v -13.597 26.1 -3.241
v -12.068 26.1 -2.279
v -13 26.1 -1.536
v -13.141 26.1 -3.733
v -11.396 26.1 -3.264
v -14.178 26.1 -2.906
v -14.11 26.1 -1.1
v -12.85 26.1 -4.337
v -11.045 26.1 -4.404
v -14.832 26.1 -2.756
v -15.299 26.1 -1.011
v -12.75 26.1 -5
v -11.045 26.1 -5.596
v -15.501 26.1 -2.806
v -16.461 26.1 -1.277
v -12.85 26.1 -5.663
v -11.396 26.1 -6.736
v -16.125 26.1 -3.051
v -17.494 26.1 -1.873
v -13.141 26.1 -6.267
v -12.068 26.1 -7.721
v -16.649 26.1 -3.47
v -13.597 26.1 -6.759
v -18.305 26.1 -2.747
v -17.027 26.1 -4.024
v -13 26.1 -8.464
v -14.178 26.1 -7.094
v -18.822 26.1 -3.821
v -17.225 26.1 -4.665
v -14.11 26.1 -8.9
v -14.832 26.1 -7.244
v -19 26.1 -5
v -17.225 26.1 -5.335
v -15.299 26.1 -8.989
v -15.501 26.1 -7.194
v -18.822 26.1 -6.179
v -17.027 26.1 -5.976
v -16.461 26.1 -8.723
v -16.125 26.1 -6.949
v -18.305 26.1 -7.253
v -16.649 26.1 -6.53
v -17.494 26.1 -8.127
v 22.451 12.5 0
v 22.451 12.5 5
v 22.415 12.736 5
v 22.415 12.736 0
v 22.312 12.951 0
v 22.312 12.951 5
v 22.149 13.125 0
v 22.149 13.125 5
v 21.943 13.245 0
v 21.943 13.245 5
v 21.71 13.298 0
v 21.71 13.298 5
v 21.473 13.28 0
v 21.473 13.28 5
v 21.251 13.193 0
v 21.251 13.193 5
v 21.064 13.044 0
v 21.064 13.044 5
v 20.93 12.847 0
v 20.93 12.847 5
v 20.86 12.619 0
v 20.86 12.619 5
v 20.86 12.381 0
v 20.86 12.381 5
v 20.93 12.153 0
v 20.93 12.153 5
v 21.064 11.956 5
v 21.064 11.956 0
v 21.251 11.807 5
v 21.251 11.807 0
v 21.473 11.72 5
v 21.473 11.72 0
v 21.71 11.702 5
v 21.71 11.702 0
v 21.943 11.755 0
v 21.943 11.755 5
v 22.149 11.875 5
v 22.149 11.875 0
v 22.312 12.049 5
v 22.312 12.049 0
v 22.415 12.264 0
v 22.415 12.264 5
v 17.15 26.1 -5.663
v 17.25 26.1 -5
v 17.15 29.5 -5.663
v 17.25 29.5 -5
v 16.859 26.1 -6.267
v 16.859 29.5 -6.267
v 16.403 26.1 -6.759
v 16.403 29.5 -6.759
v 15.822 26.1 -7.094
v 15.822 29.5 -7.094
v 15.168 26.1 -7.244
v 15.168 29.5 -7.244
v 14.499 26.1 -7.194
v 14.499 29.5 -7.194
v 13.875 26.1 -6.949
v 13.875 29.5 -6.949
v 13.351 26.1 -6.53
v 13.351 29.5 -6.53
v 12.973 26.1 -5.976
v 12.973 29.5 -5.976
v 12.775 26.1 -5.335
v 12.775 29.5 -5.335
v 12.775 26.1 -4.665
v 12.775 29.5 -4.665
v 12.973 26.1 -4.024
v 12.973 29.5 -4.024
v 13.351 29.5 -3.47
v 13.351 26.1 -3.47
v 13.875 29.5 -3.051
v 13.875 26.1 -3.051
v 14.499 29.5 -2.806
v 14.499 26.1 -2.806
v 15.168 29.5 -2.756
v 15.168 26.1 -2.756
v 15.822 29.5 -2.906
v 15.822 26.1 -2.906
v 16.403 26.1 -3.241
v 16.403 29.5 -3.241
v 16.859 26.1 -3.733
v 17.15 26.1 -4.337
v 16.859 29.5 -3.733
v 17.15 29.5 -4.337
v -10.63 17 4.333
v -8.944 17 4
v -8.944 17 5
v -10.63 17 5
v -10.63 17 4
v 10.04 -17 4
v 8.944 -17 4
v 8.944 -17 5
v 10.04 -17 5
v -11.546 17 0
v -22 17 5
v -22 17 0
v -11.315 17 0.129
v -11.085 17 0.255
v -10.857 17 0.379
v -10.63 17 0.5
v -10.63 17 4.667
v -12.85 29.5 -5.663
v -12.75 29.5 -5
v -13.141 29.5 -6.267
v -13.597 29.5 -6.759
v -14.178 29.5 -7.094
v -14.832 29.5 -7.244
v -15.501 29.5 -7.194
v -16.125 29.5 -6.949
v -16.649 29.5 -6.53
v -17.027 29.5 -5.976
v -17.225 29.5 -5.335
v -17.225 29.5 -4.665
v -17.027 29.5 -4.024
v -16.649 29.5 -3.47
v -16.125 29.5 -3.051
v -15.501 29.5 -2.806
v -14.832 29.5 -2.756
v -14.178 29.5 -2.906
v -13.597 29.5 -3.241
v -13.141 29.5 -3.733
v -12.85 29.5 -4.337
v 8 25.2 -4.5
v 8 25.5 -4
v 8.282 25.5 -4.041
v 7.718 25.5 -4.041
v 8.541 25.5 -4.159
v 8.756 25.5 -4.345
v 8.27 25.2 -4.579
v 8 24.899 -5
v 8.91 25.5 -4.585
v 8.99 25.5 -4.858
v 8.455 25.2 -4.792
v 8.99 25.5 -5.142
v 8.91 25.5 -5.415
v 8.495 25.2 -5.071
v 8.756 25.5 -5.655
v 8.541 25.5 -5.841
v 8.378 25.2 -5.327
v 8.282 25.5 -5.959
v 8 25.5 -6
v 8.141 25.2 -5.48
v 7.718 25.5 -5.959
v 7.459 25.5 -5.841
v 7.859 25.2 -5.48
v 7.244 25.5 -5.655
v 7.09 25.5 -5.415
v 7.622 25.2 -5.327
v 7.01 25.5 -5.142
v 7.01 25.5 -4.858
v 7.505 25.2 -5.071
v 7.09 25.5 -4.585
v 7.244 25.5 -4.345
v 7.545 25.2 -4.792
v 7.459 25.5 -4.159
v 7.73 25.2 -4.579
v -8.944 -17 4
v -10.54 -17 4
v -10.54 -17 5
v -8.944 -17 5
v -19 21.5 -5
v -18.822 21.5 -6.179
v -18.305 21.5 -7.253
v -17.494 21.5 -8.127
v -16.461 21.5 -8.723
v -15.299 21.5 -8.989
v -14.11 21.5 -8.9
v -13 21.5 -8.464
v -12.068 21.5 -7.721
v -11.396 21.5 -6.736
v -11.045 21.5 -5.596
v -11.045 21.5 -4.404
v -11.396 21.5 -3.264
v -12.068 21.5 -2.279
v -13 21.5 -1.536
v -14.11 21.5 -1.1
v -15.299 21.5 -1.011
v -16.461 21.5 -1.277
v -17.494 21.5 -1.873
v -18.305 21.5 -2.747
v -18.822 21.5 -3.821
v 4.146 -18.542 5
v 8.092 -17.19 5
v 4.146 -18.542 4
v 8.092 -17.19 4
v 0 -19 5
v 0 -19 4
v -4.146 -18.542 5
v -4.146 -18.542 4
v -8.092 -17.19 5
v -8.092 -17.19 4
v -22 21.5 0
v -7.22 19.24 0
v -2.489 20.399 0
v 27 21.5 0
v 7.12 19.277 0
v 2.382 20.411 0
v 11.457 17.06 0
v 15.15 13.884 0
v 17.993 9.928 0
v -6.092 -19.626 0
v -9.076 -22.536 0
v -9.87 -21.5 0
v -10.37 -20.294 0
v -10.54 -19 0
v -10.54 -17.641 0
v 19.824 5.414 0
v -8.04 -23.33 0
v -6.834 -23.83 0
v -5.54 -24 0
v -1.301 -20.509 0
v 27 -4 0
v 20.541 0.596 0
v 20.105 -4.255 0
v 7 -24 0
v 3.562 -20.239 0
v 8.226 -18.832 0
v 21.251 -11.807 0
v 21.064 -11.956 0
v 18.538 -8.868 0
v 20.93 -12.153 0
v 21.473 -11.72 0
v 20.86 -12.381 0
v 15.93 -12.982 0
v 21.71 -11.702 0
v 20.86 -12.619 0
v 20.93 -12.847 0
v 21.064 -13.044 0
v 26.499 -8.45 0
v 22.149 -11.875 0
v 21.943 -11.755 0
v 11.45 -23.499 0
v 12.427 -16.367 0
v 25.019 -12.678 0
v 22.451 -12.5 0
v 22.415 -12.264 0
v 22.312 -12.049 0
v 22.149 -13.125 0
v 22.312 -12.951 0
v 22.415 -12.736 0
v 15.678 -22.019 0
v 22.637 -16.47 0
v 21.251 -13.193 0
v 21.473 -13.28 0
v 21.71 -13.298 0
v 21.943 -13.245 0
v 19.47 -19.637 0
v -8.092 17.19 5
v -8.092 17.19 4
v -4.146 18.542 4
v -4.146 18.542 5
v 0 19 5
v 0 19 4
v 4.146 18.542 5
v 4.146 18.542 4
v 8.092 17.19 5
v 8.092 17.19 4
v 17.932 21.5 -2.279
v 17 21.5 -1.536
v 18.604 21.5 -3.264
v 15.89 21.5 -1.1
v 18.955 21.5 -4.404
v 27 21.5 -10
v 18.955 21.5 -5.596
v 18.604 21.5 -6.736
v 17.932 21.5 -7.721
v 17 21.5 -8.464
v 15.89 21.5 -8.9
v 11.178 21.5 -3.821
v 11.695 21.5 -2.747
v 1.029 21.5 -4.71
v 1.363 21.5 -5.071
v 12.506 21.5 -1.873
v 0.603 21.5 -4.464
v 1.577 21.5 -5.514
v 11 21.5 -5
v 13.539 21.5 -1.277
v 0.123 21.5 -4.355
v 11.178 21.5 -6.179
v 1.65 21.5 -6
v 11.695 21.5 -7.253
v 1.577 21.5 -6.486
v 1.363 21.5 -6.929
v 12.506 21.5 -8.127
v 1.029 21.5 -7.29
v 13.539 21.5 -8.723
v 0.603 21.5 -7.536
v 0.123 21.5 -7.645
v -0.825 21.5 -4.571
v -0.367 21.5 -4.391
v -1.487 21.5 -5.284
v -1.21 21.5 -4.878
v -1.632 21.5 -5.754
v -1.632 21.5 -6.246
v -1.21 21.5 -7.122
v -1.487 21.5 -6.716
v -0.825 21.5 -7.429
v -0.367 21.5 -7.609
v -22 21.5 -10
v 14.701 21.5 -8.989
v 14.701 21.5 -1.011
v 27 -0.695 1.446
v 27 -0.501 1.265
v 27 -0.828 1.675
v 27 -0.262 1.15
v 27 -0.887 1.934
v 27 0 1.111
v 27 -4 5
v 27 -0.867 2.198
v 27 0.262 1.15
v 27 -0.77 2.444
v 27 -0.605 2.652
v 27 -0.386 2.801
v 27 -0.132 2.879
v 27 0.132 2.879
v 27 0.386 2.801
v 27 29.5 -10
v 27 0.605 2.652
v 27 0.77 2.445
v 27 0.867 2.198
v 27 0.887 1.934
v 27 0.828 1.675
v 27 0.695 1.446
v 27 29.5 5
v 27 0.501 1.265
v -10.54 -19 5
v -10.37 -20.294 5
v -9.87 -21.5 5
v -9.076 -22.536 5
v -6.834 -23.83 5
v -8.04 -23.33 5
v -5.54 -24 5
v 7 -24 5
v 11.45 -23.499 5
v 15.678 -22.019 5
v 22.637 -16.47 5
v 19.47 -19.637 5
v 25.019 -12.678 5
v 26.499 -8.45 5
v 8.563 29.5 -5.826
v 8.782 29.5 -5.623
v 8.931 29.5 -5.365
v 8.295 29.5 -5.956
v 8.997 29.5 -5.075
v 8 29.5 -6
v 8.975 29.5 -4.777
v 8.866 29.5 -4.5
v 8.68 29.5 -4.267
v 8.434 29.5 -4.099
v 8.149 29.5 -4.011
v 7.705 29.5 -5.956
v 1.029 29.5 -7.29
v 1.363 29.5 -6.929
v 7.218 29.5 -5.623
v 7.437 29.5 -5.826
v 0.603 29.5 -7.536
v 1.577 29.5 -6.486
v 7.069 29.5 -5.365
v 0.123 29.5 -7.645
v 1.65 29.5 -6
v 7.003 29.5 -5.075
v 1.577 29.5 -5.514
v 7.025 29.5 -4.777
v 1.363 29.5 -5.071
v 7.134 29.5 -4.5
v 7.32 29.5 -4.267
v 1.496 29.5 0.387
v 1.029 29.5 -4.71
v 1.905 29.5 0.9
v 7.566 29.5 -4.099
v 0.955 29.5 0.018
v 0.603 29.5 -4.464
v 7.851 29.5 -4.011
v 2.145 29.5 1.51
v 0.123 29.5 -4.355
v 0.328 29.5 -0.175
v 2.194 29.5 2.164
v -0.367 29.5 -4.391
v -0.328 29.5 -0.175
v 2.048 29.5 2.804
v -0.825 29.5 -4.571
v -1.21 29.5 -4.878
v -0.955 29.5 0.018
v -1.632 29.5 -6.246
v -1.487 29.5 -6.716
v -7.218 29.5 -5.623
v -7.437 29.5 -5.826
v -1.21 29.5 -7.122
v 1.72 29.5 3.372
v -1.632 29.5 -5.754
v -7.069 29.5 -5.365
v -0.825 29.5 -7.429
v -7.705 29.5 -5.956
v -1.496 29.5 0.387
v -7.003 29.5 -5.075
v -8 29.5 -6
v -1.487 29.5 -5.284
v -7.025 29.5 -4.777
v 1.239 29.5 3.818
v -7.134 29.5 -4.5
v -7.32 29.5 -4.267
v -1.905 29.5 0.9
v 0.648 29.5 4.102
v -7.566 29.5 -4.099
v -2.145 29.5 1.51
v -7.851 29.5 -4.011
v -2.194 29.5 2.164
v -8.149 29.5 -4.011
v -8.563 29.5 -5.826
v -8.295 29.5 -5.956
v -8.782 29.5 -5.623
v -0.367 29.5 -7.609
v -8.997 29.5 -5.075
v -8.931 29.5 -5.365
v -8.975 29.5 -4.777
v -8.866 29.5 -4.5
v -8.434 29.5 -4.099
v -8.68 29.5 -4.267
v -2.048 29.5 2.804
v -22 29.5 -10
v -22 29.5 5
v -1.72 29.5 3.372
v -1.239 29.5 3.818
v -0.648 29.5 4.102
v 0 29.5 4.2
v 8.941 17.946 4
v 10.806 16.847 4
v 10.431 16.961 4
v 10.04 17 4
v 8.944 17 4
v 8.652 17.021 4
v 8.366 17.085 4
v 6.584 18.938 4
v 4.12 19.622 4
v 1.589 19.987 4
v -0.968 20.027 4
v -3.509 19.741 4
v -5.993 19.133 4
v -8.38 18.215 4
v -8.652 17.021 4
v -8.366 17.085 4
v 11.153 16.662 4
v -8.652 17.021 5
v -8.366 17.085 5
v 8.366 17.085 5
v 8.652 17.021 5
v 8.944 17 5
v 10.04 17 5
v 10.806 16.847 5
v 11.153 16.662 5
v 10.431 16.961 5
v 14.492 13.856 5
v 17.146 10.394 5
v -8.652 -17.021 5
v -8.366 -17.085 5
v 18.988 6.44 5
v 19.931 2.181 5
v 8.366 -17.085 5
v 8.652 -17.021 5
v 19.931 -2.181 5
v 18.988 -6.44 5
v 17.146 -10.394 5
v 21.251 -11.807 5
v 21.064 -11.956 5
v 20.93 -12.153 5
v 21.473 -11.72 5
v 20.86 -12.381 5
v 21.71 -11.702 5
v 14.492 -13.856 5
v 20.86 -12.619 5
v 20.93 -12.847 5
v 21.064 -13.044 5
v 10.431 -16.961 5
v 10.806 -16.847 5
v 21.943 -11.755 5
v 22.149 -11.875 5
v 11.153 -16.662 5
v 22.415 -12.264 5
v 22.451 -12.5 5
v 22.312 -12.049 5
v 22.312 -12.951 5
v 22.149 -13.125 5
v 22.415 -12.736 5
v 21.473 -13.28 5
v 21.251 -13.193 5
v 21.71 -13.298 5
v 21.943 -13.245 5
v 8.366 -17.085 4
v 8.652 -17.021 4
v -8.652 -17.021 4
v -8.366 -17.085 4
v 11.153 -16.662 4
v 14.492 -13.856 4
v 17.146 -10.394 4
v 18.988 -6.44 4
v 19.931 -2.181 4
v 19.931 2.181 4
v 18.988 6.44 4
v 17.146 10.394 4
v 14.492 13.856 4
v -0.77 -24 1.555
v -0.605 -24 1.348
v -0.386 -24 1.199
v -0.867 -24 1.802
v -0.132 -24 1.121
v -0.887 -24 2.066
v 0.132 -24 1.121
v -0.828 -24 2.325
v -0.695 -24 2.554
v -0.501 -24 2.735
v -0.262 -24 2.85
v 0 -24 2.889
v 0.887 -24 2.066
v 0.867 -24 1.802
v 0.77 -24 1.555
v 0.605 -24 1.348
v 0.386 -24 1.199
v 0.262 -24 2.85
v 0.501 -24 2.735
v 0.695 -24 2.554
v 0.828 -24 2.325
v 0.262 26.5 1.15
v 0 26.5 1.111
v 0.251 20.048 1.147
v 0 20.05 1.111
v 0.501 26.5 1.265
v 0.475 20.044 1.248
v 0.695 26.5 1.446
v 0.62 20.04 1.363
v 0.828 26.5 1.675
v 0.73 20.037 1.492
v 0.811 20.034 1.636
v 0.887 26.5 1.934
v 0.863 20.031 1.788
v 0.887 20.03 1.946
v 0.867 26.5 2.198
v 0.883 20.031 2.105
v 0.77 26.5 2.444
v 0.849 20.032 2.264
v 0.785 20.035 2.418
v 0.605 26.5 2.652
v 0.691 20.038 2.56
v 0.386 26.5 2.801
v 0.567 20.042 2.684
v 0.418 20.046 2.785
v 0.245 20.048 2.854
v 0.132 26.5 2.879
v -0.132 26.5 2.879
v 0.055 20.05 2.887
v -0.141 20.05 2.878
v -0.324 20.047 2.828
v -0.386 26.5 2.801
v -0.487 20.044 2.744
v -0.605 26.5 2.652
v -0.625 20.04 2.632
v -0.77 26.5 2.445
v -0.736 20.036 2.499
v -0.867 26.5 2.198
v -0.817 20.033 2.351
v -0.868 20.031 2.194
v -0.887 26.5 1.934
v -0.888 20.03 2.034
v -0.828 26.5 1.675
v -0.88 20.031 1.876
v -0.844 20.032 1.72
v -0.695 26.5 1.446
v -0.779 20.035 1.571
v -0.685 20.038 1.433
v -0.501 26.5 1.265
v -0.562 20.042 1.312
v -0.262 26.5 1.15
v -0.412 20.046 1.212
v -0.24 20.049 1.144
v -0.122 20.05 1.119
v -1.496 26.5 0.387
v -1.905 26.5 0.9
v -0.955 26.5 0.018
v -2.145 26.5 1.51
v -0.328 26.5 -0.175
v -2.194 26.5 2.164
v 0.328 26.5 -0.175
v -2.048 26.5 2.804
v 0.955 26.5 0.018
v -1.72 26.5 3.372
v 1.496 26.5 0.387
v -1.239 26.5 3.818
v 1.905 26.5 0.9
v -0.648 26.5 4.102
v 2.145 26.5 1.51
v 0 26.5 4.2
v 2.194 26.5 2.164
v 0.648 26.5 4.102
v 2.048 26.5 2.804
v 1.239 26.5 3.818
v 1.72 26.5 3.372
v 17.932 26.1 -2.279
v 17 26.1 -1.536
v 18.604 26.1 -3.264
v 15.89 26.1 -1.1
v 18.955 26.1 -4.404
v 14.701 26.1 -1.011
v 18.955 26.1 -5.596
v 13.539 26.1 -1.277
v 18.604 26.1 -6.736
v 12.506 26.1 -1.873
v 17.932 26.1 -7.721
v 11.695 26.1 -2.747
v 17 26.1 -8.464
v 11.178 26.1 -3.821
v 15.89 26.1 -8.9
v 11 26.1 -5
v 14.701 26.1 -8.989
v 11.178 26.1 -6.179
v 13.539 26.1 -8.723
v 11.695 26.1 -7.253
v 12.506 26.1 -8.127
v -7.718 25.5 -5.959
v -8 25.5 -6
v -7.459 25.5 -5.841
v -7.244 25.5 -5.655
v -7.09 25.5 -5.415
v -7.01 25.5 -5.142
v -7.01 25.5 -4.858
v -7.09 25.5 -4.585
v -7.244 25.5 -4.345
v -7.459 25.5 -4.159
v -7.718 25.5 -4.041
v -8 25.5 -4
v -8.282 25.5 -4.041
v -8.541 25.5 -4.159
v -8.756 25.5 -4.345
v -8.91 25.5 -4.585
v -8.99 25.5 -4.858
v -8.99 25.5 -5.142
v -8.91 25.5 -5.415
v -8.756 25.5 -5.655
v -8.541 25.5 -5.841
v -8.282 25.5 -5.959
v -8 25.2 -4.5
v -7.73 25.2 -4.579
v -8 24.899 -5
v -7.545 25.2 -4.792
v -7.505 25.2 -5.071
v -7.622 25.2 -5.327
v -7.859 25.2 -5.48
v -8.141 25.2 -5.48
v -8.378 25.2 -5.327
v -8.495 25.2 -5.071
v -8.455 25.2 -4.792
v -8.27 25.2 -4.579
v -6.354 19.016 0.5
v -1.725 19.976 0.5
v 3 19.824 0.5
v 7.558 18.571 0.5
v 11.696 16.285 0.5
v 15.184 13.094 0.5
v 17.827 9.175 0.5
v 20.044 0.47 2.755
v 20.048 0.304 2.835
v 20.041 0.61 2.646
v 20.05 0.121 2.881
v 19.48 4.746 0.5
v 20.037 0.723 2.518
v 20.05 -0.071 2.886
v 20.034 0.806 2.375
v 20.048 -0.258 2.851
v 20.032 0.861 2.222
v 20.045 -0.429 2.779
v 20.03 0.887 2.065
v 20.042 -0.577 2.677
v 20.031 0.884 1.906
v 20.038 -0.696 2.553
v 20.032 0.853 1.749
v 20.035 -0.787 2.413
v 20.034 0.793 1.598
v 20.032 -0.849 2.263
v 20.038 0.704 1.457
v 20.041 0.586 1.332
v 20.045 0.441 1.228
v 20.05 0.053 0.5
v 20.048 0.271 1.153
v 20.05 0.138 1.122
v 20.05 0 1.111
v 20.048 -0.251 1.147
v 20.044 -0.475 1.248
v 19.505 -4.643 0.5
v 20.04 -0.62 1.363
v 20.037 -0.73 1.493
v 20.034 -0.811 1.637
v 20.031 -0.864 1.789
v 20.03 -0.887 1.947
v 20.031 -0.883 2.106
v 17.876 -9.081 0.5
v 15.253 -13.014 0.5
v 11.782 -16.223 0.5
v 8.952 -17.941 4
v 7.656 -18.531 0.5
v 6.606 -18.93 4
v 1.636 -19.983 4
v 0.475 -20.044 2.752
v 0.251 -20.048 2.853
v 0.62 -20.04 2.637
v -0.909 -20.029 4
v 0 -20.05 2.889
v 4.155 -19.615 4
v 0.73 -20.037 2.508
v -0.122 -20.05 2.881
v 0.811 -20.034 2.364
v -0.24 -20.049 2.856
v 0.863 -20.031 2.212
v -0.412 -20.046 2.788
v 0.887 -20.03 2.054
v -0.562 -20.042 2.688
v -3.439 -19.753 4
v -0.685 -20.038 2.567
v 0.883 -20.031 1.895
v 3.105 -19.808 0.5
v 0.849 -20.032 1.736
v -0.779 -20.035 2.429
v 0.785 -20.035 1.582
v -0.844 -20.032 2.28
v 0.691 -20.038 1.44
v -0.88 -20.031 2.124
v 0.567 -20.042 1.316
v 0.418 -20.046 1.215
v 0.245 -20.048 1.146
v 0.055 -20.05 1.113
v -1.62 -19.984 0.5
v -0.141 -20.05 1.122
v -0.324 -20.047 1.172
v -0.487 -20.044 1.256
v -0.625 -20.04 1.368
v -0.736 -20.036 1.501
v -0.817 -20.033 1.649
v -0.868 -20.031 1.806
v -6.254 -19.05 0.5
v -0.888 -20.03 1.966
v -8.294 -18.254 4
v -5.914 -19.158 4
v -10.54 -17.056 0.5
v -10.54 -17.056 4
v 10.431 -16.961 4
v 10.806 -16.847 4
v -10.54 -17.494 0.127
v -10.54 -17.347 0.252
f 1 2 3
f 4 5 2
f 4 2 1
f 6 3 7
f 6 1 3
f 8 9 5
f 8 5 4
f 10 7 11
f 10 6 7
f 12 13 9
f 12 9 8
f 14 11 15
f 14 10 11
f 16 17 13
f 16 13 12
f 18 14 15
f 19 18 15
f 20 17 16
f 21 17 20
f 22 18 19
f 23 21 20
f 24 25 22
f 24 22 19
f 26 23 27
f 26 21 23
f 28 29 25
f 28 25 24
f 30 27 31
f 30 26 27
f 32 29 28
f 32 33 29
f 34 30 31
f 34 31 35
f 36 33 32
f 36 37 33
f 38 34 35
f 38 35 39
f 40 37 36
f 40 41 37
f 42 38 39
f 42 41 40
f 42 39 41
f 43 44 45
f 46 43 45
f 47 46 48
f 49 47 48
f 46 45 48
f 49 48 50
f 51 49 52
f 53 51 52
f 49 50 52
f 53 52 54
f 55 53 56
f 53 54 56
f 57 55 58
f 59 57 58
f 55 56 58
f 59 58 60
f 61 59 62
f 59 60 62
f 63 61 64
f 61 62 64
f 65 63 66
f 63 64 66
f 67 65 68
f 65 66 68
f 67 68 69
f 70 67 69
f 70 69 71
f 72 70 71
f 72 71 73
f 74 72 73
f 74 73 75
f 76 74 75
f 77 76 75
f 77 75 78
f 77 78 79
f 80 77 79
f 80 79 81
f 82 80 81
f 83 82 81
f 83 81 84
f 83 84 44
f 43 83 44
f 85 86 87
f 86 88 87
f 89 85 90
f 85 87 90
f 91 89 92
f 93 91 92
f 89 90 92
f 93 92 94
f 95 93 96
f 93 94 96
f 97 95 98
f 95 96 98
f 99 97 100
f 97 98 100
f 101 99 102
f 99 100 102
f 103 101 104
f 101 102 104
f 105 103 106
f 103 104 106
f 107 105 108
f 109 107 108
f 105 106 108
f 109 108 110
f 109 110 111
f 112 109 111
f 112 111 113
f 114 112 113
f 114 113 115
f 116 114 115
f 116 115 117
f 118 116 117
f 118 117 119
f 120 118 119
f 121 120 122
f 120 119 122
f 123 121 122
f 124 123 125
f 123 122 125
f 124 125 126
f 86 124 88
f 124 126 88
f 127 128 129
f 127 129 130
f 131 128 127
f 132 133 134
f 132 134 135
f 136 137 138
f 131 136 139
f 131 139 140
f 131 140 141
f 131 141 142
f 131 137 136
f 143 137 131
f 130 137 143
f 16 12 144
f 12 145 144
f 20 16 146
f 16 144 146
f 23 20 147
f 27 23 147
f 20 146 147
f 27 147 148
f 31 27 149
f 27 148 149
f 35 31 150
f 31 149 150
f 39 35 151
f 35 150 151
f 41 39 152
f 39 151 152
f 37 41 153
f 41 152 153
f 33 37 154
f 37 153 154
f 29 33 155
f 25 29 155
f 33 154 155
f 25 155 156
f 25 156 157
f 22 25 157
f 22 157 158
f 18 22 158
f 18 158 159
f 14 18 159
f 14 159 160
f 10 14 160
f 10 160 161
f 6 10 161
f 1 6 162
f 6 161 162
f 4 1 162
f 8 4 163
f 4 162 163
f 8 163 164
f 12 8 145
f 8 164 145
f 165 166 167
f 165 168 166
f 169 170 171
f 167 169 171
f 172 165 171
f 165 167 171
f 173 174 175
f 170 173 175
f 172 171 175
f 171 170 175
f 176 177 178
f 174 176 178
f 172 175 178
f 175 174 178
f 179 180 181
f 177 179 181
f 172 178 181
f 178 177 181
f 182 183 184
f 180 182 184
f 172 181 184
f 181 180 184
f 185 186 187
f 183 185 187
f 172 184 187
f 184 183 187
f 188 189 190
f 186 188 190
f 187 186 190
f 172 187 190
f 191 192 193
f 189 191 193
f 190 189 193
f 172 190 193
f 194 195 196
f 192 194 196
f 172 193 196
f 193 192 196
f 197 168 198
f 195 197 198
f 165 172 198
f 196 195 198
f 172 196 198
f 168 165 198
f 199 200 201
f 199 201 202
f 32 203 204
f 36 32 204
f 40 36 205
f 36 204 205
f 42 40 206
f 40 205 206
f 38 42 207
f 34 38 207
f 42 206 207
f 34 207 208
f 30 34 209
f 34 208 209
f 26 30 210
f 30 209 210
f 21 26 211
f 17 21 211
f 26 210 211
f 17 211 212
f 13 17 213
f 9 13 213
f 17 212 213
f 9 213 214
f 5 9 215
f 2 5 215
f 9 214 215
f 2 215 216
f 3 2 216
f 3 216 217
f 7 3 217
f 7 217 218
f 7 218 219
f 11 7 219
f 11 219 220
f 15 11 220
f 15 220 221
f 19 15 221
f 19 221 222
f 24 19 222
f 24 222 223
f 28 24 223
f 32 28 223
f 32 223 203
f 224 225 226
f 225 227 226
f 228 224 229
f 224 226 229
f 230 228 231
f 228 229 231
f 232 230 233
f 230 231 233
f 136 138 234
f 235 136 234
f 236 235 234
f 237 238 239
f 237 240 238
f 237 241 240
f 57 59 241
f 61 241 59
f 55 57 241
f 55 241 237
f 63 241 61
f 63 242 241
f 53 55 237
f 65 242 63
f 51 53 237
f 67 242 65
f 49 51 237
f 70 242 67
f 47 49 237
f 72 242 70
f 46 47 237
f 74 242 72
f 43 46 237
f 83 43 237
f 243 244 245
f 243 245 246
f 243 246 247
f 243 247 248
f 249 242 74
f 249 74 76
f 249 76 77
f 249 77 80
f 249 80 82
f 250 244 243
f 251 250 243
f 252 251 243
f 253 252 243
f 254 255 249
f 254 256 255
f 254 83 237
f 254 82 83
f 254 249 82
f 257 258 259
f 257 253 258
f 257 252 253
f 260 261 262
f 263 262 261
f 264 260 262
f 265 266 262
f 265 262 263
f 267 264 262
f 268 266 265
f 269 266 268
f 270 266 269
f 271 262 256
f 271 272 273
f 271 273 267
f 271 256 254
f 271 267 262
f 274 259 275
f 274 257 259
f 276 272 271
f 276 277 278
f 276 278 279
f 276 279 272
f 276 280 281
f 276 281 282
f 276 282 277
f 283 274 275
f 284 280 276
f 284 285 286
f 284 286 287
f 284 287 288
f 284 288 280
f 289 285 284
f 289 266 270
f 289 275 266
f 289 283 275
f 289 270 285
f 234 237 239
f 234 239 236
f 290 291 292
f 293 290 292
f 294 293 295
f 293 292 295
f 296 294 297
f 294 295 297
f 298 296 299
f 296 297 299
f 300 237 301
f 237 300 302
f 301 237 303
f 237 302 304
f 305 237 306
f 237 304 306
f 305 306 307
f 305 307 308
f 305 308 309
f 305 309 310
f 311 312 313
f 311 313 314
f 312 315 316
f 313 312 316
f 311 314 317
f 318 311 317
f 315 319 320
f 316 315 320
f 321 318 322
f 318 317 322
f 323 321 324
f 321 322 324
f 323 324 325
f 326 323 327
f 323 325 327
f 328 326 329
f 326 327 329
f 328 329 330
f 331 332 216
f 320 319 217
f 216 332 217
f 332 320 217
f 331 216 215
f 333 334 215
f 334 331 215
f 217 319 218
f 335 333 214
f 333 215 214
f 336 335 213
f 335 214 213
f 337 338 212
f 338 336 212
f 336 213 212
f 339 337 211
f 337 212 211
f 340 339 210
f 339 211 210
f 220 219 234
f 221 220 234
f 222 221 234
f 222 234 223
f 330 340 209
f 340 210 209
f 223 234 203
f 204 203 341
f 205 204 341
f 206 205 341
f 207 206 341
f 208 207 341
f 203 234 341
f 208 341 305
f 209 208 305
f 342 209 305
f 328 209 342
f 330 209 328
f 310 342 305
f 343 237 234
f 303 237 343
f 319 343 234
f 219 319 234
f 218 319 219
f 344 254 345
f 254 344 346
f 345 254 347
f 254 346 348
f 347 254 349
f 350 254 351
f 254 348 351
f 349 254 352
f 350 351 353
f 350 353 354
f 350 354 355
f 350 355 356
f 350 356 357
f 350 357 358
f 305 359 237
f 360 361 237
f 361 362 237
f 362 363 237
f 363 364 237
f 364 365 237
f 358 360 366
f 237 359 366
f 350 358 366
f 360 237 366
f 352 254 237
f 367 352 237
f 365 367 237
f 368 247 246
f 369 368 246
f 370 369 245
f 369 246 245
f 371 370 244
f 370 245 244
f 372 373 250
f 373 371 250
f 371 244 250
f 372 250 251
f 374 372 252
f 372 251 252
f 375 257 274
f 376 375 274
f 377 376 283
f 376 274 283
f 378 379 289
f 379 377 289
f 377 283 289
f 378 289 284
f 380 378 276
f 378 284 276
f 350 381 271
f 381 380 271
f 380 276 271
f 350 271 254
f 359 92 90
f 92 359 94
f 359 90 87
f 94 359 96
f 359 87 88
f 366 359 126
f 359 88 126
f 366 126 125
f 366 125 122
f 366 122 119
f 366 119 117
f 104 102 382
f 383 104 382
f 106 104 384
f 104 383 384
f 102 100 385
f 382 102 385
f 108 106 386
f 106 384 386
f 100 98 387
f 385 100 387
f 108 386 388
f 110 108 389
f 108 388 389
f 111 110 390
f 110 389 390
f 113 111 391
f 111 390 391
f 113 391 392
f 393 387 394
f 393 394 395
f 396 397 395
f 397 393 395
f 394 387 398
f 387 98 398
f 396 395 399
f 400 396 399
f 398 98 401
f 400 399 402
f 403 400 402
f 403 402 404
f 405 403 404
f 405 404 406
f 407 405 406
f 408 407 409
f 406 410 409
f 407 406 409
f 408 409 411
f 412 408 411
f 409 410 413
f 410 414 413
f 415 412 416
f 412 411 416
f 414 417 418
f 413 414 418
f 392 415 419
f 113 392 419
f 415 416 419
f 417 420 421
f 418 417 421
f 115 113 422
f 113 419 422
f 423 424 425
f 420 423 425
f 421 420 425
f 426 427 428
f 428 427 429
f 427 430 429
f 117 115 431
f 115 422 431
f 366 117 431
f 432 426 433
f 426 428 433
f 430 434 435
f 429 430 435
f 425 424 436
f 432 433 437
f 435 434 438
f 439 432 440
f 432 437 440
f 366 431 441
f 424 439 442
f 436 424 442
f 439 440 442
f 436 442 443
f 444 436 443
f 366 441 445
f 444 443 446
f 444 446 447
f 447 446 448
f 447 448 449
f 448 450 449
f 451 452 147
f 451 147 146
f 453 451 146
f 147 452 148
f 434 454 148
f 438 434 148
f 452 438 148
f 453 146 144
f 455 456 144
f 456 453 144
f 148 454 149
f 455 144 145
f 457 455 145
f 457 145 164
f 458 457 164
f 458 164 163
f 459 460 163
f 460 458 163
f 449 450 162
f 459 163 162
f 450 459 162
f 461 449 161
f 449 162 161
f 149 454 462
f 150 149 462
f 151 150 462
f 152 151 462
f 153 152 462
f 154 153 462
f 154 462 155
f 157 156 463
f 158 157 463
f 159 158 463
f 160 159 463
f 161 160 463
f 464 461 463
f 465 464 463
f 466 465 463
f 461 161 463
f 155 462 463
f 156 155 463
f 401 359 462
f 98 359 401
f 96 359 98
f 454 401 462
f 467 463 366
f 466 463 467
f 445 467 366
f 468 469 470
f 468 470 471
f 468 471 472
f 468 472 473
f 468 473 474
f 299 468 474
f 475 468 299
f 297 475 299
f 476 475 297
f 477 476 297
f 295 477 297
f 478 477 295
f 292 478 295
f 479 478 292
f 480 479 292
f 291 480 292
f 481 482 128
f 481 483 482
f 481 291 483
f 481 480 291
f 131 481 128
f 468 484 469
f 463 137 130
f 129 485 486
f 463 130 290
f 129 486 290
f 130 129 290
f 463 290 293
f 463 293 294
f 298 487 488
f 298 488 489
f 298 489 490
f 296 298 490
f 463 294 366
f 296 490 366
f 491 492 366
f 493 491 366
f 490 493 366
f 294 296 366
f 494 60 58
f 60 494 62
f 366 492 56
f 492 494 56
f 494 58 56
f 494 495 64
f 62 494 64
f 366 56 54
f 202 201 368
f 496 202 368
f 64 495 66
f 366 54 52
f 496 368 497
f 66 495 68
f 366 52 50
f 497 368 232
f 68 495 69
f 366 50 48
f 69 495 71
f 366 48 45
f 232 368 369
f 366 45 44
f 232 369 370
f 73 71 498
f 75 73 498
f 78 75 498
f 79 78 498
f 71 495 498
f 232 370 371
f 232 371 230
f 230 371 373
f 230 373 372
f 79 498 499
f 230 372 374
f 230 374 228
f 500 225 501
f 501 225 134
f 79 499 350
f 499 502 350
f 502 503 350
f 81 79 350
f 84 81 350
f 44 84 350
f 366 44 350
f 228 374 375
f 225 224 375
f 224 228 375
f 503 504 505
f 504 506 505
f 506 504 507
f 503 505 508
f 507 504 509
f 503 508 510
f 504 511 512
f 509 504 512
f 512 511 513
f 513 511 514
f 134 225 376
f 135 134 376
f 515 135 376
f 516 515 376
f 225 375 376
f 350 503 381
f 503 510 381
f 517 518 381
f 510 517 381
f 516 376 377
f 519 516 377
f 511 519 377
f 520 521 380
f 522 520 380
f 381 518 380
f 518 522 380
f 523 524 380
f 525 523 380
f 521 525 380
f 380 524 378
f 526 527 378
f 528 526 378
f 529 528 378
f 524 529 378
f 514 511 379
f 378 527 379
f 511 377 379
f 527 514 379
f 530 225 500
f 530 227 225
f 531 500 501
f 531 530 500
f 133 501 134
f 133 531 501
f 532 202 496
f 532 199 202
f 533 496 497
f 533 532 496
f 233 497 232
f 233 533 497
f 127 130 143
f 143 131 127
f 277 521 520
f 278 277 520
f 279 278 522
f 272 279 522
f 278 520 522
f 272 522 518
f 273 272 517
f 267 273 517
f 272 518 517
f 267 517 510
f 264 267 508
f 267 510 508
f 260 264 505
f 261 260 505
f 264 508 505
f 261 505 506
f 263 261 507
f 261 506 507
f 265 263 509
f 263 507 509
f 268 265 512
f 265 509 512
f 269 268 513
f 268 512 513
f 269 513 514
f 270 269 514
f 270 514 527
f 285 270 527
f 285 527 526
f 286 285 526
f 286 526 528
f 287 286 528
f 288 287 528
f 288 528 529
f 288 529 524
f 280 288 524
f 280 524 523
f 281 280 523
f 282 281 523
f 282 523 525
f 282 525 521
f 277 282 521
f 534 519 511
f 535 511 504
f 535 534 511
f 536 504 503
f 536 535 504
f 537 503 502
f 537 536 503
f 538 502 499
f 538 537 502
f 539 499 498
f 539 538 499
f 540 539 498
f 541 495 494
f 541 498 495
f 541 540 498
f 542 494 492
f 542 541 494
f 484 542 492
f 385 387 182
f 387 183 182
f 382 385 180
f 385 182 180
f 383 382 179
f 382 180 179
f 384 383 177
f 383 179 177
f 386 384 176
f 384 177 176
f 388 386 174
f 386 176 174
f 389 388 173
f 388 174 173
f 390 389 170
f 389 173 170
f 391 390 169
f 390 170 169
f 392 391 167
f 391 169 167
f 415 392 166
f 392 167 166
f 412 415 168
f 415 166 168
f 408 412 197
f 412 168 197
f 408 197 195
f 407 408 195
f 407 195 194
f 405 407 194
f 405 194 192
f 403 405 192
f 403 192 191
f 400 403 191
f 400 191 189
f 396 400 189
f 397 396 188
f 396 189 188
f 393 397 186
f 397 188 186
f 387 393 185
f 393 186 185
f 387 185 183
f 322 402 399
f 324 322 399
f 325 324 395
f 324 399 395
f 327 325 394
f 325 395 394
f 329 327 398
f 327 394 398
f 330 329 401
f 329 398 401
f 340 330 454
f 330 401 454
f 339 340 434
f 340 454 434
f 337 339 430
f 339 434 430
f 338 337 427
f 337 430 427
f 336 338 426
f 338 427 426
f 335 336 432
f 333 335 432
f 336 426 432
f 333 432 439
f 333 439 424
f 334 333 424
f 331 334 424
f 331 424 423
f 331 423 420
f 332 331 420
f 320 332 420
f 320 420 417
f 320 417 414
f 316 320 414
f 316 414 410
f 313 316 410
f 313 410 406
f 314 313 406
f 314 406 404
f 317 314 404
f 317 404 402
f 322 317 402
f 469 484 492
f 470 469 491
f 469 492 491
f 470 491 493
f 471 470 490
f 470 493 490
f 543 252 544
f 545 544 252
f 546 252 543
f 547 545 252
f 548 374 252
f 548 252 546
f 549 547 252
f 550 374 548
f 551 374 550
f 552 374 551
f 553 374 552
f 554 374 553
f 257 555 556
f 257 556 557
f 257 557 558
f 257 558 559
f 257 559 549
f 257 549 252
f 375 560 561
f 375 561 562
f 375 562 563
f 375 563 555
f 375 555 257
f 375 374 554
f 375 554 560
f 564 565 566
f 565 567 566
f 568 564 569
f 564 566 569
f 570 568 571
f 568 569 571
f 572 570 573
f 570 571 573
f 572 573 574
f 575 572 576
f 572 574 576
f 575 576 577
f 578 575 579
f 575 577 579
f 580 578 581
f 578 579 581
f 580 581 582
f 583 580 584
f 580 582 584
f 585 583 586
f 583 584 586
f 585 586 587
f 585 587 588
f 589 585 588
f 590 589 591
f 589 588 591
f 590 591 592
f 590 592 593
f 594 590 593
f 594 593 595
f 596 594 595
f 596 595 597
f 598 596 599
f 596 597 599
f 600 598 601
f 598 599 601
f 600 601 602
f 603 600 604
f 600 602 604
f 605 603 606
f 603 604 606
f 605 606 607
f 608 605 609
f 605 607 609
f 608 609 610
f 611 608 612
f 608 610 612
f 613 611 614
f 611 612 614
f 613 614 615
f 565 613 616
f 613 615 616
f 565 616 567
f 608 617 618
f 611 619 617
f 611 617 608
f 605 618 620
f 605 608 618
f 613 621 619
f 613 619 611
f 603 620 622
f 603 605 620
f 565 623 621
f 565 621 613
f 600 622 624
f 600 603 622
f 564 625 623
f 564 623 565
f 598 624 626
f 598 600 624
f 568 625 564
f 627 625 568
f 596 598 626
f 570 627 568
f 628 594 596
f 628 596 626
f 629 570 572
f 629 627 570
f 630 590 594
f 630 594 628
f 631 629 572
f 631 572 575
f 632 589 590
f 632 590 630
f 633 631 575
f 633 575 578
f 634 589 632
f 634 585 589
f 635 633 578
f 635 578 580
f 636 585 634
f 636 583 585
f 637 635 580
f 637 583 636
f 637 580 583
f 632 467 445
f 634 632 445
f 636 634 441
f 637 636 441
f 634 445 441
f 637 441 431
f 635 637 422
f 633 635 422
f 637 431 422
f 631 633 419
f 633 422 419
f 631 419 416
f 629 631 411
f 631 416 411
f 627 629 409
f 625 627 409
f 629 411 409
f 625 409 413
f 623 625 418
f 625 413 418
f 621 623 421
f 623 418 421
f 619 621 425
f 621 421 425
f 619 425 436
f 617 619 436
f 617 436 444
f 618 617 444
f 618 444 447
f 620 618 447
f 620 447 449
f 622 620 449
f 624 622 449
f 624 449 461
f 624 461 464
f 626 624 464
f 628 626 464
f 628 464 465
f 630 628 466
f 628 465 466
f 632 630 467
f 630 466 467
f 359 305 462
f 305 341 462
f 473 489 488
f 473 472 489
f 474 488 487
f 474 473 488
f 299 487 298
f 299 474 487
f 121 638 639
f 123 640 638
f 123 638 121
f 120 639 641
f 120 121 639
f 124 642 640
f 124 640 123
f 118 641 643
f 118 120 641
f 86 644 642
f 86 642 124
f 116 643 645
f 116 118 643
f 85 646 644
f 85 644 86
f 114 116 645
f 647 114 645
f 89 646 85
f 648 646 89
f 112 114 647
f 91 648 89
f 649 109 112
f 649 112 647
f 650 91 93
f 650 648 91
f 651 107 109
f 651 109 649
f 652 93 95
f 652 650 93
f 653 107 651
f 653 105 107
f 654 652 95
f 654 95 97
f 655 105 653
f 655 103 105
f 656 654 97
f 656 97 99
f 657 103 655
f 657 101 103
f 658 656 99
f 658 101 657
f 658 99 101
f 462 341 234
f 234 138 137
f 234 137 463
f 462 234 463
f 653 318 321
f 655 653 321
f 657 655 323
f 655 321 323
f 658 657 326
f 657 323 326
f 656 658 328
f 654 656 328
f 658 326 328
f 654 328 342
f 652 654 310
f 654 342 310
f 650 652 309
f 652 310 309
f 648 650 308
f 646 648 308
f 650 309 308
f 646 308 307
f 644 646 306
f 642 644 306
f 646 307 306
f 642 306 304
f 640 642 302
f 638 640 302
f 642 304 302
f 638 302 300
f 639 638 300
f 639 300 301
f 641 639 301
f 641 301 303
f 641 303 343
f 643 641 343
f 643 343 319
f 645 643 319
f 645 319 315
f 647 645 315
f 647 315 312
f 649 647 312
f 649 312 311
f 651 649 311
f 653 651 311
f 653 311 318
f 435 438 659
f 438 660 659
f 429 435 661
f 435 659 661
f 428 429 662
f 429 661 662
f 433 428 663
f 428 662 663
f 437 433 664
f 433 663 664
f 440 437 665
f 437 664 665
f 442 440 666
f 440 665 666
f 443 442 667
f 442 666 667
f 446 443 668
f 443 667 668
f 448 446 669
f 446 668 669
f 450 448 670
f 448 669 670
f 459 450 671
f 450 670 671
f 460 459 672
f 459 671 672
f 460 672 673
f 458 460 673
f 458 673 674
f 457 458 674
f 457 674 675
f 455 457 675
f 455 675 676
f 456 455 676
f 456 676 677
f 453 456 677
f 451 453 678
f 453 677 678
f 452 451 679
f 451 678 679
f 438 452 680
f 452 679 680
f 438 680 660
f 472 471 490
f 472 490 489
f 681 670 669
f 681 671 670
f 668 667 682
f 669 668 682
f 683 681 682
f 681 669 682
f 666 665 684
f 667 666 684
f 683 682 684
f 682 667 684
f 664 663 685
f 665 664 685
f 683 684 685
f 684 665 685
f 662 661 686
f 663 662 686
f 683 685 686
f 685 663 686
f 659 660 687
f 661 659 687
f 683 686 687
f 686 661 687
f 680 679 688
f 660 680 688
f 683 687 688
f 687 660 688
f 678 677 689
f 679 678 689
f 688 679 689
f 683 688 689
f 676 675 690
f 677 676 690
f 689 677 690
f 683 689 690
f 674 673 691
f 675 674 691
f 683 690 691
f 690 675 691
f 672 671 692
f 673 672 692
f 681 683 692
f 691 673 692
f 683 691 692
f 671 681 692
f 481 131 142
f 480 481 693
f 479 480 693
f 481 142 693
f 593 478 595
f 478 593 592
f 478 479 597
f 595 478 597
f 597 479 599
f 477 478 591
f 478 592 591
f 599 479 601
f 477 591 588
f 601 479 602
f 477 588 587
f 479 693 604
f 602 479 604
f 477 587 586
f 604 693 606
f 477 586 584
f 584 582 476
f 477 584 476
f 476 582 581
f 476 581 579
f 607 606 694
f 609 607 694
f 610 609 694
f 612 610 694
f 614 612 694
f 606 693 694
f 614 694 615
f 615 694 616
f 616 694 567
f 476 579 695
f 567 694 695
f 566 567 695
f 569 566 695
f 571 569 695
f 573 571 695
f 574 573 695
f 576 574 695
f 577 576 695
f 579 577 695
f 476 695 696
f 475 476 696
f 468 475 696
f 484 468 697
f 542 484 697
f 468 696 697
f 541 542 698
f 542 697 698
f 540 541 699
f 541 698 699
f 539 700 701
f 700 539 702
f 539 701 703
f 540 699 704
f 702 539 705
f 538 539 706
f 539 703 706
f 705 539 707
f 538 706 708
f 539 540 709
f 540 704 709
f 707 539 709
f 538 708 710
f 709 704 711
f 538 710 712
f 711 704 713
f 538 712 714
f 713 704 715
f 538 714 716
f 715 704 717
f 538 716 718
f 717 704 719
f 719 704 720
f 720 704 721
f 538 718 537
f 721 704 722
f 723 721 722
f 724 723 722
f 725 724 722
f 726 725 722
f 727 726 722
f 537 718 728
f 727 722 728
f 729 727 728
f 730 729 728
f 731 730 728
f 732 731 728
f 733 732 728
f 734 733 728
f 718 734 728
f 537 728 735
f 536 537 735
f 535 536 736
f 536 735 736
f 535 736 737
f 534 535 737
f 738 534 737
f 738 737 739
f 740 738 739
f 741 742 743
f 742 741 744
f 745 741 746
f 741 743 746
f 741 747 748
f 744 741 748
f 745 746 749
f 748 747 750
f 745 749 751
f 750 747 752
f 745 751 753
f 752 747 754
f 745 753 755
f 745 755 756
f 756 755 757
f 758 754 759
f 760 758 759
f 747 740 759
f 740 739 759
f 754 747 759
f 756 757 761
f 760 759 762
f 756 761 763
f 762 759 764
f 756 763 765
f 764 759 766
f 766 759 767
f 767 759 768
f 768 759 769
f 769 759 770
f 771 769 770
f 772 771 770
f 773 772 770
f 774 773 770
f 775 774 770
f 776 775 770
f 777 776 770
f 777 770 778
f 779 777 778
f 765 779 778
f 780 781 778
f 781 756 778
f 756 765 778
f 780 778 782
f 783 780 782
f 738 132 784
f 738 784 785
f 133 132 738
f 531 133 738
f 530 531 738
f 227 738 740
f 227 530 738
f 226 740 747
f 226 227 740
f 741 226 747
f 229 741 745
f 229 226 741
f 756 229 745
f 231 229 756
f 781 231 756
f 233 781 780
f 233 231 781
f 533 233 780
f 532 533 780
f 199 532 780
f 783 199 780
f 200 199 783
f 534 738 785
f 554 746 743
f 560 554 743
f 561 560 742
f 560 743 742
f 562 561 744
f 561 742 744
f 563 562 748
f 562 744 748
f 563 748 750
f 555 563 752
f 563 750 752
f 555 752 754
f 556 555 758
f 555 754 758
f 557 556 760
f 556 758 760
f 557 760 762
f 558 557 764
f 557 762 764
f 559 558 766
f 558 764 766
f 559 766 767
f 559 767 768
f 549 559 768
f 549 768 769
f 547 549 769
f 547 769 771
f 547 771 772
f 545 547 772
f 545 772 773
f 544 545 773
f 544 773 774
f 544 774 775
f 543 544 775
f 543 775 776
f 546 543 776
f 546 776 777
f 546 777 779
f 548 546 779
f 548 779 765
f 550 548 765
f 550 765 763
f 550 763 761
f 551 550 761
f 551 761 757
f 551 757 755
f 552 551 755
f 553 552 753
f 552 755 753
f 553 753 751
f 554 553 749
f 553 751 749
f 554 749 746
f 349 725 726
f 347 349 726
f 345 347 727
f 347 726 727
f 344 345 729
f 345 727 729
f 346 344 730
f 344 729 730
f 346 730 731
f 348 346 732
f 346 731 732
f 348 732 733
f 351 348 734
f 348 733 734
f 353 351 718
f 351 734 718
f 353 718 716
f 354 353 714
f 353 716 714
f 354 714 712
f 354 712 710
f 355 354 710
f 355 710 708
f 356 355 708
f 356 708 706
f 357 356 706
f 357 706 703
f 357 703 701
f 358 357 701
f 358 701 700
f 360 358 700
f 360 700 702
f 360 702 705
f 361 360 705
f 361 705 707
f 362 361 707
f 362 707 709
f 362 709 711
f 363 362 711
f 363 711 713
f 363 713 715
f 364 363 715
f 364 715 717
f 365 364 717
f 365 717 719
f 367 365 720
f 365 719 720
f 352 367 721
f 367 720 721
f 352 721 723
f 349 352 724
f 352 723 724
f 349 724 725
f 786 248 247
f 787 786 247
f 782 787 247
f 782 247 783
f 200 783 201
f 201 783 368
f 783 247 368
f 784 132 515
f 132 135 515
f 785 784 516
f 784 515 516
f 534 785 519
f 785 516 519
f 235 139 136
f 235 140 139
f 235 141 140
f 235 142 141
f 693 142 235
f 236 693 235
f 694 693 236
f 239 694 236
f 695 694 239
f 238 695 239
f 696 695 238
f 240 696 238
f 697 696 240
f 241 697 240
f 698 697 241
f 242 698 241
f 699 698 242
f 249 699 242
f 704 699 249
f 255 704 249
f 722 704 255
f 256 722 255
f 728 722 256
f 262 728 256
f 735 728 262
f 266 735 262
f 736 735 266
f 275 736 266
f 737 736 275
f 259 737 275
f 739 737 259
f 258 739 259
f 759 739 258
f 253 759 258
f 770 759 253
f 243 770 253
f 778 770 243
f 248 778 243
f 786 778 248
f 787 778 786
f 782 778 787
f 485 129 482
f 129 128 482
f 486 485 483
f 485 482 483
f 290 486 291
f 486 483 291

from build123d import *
from build123d.topology import SkipClean

# Parameters (mm, degrees)
SKETCH_2_R                = 22
EXTRUDE_1_DEPTH           = 5
SKETCH_5_W                = 7
SKETCH_5_H                = 15
EXTRUDE_2_DEPTH           = 5
HOLE_WIZARD_2_56_3_D      = 1.778
HOLE_WIZARD_2_56_3_DEPTH  = 15
HOLE_WIZARD_2_56_3_TIP    = 0.534165
SKETCH_13_R               = 20.05
CUT_EXTRUDE_2_DEPTH       = 4
SKETCH_14_R               = 19
CUT_EXTRUDE_3_DEPTH       = 2
CUT_EXTRUDE_4_DEPTH       = 38.016888
EXTRUDE_3_REACH           = 58.225
EXTRUDE_3_END_RADIUS      = 22
SKETCH_16_W               = 18.5
SKETCH_16_H               = 5
FILLET_1_R                = 2
CHAMFER_1_SIZE            = 0.5
SKETCH_26_W               = 11.46
SKETCH_26_H               = 38.490745
CUT_EXTRUDE_5_DEPTH       = 38.138255
SKETCH_27_W               = 44
SKETCH_27_H               = 8
EXTRUDE_4_DEPTH           = 10
HOLE_WIZARD_2_D           = 4.5
HOLE_WIZARD_2_DEPTH       = 10.1
HOLE_WIZARD_2_CBORE_D     = 8
HOLE_WIZARD_2_CBORE_DEPTH = 4.6
HOLE_WIZARD_2_TIP         = 1.351936
EXTRUDE_5_DEPTH           = 5
EXTRUDE_6_REACH           = 60.062
EXTRUDE_6_END_RADIUS      = 22
SKETCH_32_W               = 5
SKETCH_32_H               = 22
MM_4_D                    = 2
MM_4_DEPTH                = 4
MM_4_TIP                  = 0.600861
SKETCH_41_R               = 2.2
CUT_EXTRUDE_6_DEPTH       = 3
SKETCH_45_W               = 27
SKETCH_45_H               = 5
EXTRUDE_7_DEPTH           = 2
EXTRUDE_9_REACH           = 62.756
SKETCH_47_W               = 10.54
SKETCH_47_H               = 5
HOLE_WIZARD_2_56_1_D      = 1.778
HOLE_WIZARD_2_56_1_DEPTH  = 5.73
HOLE_WIZARD_2_56_1_TIP    = 0.534165
FILLET_7_R                = 20
FILLET_8_R                = 5
HOLE_WIZARD_2_56_2_D      = 1.778
HOLE_WIZARD_M4_2_D        = 3.3
HOLE_WIZARD_M2_10_D       = 1.6


with BuildPart() as part:
    # 草图2 → 凸台-拉伸1 (new body)
    with BuildSketch(Plane.XY):
        Circle(SKETCH_2_R)
    extrude(amount=EXTRUDE_1_DEPTH)

    # 草图5 → 凸台-拉伸2 (add)
    with BuildSketch(Plane.XY.offset(5)):
        with Locations((0, 22)):
            Rectangle(SKETCH_5_W, SKETCH_5_H)
    extrude(amount=-EXTRUDE_2_DEPTH)

    # #2-56 螺纹孔3
    with Locations(Plane(origin=(0, 29.5, 2), x_dir=(0, 0, 1), z_dir=(0, 1, 0))):
        with Locations((0, 0)):
            Hole(HOLE_WIZARD_2_56_3_D / 2, depth=HOLE_WIZARD_2_56_3_DEPTH)
            with Locations((0, 0, -(HOLE_WIZARD_2_56_3_DEPTH + HOLE_WIZARD_2_56_3_TIP / 2))):  # 118° drill point
                Cone(0, HOLE_WIZARD_2_56_3_D / 2, HOLE_WIZARD_2_56_3_TIP, mode=Mode.SUBTRACT)

    # 草图13 → 切除-拉伸2 (cut)
    with BuildSketch(Plane(origin=(0, 0, 0), x_dir=(-1, 0, 0), z_dir=(0, 0, -1))):
        Circle(SKETCH_13_R)
    extrude(amount=-CUT_EXTRUDE_2_DEPTH, mode=Mode.SUBTRACT)

    # 草图14 → 切除-拉伸3 (cut)
    with BuildSketch(Plane(origin=(0, 0, 4), x_dir=(-1, 0, 0), z_dir=(0, 0, -1))):
        Circle(SKETCH_14_R)
    extrude(amount=-CUT_EXTRUDE_3_DEPTH, mode=Mode.SUBTRACT)

    # 草图15 → 切除-拉伸4 (cut, through all)
    with SkipClean():  # the faces are left unmerged after this step: merging them gives an invalid solid
        with BuildSketch(Plane(origin=(0, 0, 4), x_dir=(-1, 0, 0), z_dir=(0, 0, -1))):
            with BuildLine():
                Line((-10.630263, 17), (10.630263, 17))
                ThreePointArc((10.630263, 17), (20.05, 0), (10.630263, -17))
                Line((10.630263, -17), (-10.630263, -17))
                ThreePointArc((-10.630263, -17), (-20.05, 0), (-10.630263, 17))
            make_face()
        extrude(amount=-CUT_EXTRUDE_4_DEPTH, mode=Mode.SUBTRACT)

    # 凸台-拉伸3: up to this cylinder (the profile starts outside it)
    with SkipClean():  # the faces are left unmerged after this step: merging them gives an invalid solid
        extrude_3_end = Plane(origin=(0, 0, 2.5), z_dir=(0, 0, -1)) * Cylinder(EXTRUDE_3_END_RADIUS, 161.45, mode=Mode.PRIVATE)
        # 草图16 → 凸台-拉伸3 (add, up to the surface)
        with BuildSketch(Plane(origin=(0, 29.5, 0), x_dir=(1, 0, 0), z_dir=(0, 1, 0)), mode=Mode.PRIVATE) as extrude_3_sk1:
            with Locations((-12.75, -2.5)):
                Rectangle(SKETCH_16_W, SKETCH_16_H)
        extrude_3_tool1 = extrude(extrude_3_sk1.sketch, amount=-EXTRUDE_3_REACH, mode=Mode.PRIVATE) - extrude_3_end
        add(extrude_3_tool1.solids().sort_by_distance((-12.75, 29.5, 2.5))[0])
        # 草图16 → 凸台-拉伸3 (add, up to the surface)
        with BuildSketch(Plane(origin=(0, 29.5, 0), x_dir=(1, 0, 0), z_dir=(0, 1, 0)), mode=Mode.PRIVATE) as extrude_3_sk2:
            with Locations((12.75, -2.5)):
                Rectangle(SKETCH_16_W, SKETCH_16_H)
        extrude_3_tool2 = extrude(extrude_3_sk2.sketch, amount=-EXTRUDE_3_REACH, mode=Mode.PRIVATE) - extrude_3_end
        add(extrude_3_tool2.solids().sort_by_distance((12.75, 29.5, 2.5))[0])

    # 圆角1
    fillet_1_edges = [part.edges().sort_by_distance(p)[0] for p in [
        (8.485281, -17, 4.5),
        (-8.485281, -17, 4.5),
        (-8.485281, 17, 4.5),
        (8.485281, 17, 4.5),
        (10.630263, 17, 4.5),
        (10.630263, -17, 4.5),
    ]]
    fillet(fillet_1_edges, radius=FILLET_1_R)

    # 倒角1
    chamfer_1_edges = [part.edges().sort_by_distance(p)[0] for p in [
        (20.05, 0, 0),
    ]]
    chamfer(chamfer_1_edges, length=CHAMFER_1_SIZE)

    # 草图26 → 切除-拉伸5 (cut, through all)
    with SkipClean():  # the faces are left unmerged after this step: merging them gives an invalid solid
        with BuildSketch(Plane.XY.offset(5)):
            with Locations((-16.27, -2.245373)):
                Rectangle(SKETCH_26_W, SKETCH_26_H)
        extrude(amount=-CUT_EXTRUDE_5_DEPTH, mode=Mode.SUBTRACT)

    # 草图27 → 凸台-拉伸4 (add)
    with SkipClean():  # the faces are left unmerged after this step: merging them gives an invalid solid
        with BuildSketch(Plane(origin=(0, 0, 0), x_dir=(-1, 0, 0), z_dir=(0, 0, -1))):
            with Locations((0, 25.5)):
                Rectangle(SKETCH_27_W, SKETCH_27_H)
        extrude(amount=EXTRUDE_4_DEPTH)

    # 打孔尺寸(%根据)内六角圆柱头螺钉的类型2
    with Locations(Plane(origin=(-15, 21.5, -5), x_dir=(-1, 0, 0), z_dir=(0, -1, 0))):
        with Locations((0, 0), (-30, 0)):
            CounterBoreHole(HOLE_WIZARD_2_D / 2, HOLE_WIZARD_2_CBORE_D / 2, HOLE_WIZARD_2_CBORE_DEPTH, depth=HOLE_WIZARD_2_DEPTH)
            with Locations((0, 0, -(HOLE_WIZARD_2_DEPTH + HOLE_WIZARD_2_TIP / 2))):  # 118° drill point
                Cone(0, HOLE_WIZARD_2_D / 2, HOLE_WIZARD_2_TIP, mode=Mode.SUBTRACT)

    # 草图31 → 凸台-拉伸5 (add)
    with SkipClean():  # the faces are left unmerged after this step: merging them gives an invalid solid
        with BuildSketch(Plane(origin=(22, 0, 0), x_dir=(0, 0, -1), z_dir=(1, 0, 0))):
            Polygon((-5, 0), (0, 0), (0, 21.5), (10, 21.5), (10, 29.5), (-5, 29.5), align=None)
        extrude(amount=EXTRUDE_5_DEPTH)

    # 凸台-拉伸6: up to this cylinder (the profile starts outside it)
    with SkipClean():  # the faces are left unmerged after this step: merging them gives an invalid solid
        extrude_6_end = Plane(origin=(0, 0, 2.5), z_dir=(0, 0, -1)) * Cylinder(EXTRUDE_6_END_RADIUS, 165.124, mode=Mode.PRIVATE)
        # 草图32 → 凸台-拉伸6 (add, up to the surface)
        with BuildSketch(Plane(origin=(27, 0, 0), x_dir=(0, 0, -1), z_dir=(1, 0, 0)), mode=Mode.PRIVATE) as extrude_6_sk1:
            with Locations((-2.5, -11)):
                Rectangle(SKETCH_32_W, SKETCH_32_H)
        extrude_6_tool1 = extrude(extrude_6_sk1.sketch, amount=-EXTRUDE_6_REACH, mode=Mode.PRIVATE) - extrude_6_end
        add(extrude_6_tool1.solids().sort_by_distance((27, -11, 2.5))[0])

    # 大小mm 暗销孔4
    with Locations(Plane(origin=(-8, 29.5, -5), x_dir=(0, 0, 1), z_dir=(0, 1, 0))):
        with Locations((0, 0), (0, 16)):
            Hole(MM_4_D / 2, depth=MM_4_DEPTH)
            with Locations((0, 0, -(MM_4_DEPTH + MM_4_TIP / 2))):  # 118° drill point
                Cone(0, MM_4_D / 2, MM_4_TIP, mode=Mode.SUBTRACT)

    # 草图41 → 切除-拉伸6 (cut)
    with SkipClean():  # the faces are left unmerged after this step: merging them gives an invalid solid
        with BuildSketch(Plane(origin=(0, 29.5, 0), x_dir=(1, 0, 0), z_dir=(0, 1, 0))):
            with Locations(Location((0, -2, 0), (0, 0, 270))):
                Circle(SKETCH_41_R)
        extrude(amount=-CUT_EXTRUDE_6_DEPTH, mode=Mode.SUBTRACT)

    # 草图45 → 凸台-拉伸7 (add)
    with SkipClean():  # the faces are left unmerged after this step: merging them gives an invalid solid
        with BuildSketch(Plane.XZ.offset(22)):
            with Locations((13.5, 2.5)):
                Rectangle(SKETCH_45_W, SKETCH_45_H)
        extrude(amount=EXTRUDE_7_DEPTH)

    # 草图47 → 凸台-拉伸9 (add, up to next)
    with BuildSketch(Plane.XZ.offset(24), mode=Mode.PRIVATE) as extrude_9_sk1:
        with Locations((-5.27, 2.5)):
            Rectangle(SKETCH_47_W, SKETCH_47_H)
    extrude_9_tool1 = extrude(extrude_9_sk1.sketch, amount=-EXTRUDE_9_REACH, mode=Mode.PRIVATE) - part.part
    add(extrude_9_tool1.solids().sort_by_distance((-5.27, -24, 2.5))[0])

    # #2-56 螺纹孔1
    with Locations(Plane(origin=(0, -24, 2), x_dir=(0, 0, -1), z_dir=(0, -1, 0))):
        with Locations((0, 0)):
            Hole(HOLE_WIZARD_2_56_1_D / 2, depth=HOLE_WIZARD_2_56_1_DEPTH)
            with Locations((0, 0, -(HOLE_WIZARD_2_56_1_DEPTH + HOLE_WIZARD_2_56_1_TIP / 2))):  # 118° drill point
                Cone(0, HOLE_WIZARD_2_56_1_D / 2, HOLE_WIZARD_2_56_1_TIP, mode=Mode.SUBTRACT)

    # 圆角7
    # the kernel refuses this fillet: 20 mm, written as the material it takes off along each edge
    with BuildSketch(Plane(origin=(27, -24, -50), x_dir=(-1, 0, 0), z_dir=(0, 0, 1))) as fillet_7_piece_1:
        with BuildLine():
            CenterArc((FILLET_7_R, -FILLET_7_R), FILLET_7_R, 90, 90)
            Line((0, -FILLET_7_R), (0, 0))
            Line((0, 0), (FILLET_7_R, 0))
        make_face()
    extrude(amount=105, mode=Mode.SUBTRACT)

    # 圆角8
    # the kernel refuses this fillet: 5 mm, written as the material it takes off along each edge
    with BuildSketch(Plane(origin=(-10.54, -24, -12.5), x_dir=(0, 1, 0), z_dir=(0, 0, 1))) as fillet_8_piece_1:
        with BuildLine():
            CenterArc((FILLET_8_R, -FILLET_8_R), FILLET_8_R, 90, 90)
            Line((0, -FILLET_8_R), (0, 0))
            Line((0, 0), (FILLET_8_R, 0))
        make_face()
    extrude(amount=30, mode=Mode.SUBTRACT)

    # #2-56 螺纹孔2 (through all)
    with Locations(Plane(origin=(27, 0, 2), x_dir=(0, 0, 1), z_dir=(1, 0, 0))):
        with Locations((0, 0)):
            Hole(HOLE_WIZARD_2_56_2_D / 2)

    # M4 螺纹孔2 (through all)
    with Locations(Plane(origin=(0, 21.5, -6), x_dir=(-1, 0, 0), z_dir=(0, -1, 0))):
        with Locations((0, 0)):
            Hole(HOLE_WIZARD_M4_2_D / 2)

    # M2 螺纹孔10 (through all)
    with Locations(Plane(origin=(21.650635, 12.5, 0), x_dir=(-1, 0, 0), z_dir=(0, 0, -1))):
        with Locations((0, 0), (0, -25)):
            Hole(HOLE_WIZARD_M2_10_D / 2)


solid = part.part
